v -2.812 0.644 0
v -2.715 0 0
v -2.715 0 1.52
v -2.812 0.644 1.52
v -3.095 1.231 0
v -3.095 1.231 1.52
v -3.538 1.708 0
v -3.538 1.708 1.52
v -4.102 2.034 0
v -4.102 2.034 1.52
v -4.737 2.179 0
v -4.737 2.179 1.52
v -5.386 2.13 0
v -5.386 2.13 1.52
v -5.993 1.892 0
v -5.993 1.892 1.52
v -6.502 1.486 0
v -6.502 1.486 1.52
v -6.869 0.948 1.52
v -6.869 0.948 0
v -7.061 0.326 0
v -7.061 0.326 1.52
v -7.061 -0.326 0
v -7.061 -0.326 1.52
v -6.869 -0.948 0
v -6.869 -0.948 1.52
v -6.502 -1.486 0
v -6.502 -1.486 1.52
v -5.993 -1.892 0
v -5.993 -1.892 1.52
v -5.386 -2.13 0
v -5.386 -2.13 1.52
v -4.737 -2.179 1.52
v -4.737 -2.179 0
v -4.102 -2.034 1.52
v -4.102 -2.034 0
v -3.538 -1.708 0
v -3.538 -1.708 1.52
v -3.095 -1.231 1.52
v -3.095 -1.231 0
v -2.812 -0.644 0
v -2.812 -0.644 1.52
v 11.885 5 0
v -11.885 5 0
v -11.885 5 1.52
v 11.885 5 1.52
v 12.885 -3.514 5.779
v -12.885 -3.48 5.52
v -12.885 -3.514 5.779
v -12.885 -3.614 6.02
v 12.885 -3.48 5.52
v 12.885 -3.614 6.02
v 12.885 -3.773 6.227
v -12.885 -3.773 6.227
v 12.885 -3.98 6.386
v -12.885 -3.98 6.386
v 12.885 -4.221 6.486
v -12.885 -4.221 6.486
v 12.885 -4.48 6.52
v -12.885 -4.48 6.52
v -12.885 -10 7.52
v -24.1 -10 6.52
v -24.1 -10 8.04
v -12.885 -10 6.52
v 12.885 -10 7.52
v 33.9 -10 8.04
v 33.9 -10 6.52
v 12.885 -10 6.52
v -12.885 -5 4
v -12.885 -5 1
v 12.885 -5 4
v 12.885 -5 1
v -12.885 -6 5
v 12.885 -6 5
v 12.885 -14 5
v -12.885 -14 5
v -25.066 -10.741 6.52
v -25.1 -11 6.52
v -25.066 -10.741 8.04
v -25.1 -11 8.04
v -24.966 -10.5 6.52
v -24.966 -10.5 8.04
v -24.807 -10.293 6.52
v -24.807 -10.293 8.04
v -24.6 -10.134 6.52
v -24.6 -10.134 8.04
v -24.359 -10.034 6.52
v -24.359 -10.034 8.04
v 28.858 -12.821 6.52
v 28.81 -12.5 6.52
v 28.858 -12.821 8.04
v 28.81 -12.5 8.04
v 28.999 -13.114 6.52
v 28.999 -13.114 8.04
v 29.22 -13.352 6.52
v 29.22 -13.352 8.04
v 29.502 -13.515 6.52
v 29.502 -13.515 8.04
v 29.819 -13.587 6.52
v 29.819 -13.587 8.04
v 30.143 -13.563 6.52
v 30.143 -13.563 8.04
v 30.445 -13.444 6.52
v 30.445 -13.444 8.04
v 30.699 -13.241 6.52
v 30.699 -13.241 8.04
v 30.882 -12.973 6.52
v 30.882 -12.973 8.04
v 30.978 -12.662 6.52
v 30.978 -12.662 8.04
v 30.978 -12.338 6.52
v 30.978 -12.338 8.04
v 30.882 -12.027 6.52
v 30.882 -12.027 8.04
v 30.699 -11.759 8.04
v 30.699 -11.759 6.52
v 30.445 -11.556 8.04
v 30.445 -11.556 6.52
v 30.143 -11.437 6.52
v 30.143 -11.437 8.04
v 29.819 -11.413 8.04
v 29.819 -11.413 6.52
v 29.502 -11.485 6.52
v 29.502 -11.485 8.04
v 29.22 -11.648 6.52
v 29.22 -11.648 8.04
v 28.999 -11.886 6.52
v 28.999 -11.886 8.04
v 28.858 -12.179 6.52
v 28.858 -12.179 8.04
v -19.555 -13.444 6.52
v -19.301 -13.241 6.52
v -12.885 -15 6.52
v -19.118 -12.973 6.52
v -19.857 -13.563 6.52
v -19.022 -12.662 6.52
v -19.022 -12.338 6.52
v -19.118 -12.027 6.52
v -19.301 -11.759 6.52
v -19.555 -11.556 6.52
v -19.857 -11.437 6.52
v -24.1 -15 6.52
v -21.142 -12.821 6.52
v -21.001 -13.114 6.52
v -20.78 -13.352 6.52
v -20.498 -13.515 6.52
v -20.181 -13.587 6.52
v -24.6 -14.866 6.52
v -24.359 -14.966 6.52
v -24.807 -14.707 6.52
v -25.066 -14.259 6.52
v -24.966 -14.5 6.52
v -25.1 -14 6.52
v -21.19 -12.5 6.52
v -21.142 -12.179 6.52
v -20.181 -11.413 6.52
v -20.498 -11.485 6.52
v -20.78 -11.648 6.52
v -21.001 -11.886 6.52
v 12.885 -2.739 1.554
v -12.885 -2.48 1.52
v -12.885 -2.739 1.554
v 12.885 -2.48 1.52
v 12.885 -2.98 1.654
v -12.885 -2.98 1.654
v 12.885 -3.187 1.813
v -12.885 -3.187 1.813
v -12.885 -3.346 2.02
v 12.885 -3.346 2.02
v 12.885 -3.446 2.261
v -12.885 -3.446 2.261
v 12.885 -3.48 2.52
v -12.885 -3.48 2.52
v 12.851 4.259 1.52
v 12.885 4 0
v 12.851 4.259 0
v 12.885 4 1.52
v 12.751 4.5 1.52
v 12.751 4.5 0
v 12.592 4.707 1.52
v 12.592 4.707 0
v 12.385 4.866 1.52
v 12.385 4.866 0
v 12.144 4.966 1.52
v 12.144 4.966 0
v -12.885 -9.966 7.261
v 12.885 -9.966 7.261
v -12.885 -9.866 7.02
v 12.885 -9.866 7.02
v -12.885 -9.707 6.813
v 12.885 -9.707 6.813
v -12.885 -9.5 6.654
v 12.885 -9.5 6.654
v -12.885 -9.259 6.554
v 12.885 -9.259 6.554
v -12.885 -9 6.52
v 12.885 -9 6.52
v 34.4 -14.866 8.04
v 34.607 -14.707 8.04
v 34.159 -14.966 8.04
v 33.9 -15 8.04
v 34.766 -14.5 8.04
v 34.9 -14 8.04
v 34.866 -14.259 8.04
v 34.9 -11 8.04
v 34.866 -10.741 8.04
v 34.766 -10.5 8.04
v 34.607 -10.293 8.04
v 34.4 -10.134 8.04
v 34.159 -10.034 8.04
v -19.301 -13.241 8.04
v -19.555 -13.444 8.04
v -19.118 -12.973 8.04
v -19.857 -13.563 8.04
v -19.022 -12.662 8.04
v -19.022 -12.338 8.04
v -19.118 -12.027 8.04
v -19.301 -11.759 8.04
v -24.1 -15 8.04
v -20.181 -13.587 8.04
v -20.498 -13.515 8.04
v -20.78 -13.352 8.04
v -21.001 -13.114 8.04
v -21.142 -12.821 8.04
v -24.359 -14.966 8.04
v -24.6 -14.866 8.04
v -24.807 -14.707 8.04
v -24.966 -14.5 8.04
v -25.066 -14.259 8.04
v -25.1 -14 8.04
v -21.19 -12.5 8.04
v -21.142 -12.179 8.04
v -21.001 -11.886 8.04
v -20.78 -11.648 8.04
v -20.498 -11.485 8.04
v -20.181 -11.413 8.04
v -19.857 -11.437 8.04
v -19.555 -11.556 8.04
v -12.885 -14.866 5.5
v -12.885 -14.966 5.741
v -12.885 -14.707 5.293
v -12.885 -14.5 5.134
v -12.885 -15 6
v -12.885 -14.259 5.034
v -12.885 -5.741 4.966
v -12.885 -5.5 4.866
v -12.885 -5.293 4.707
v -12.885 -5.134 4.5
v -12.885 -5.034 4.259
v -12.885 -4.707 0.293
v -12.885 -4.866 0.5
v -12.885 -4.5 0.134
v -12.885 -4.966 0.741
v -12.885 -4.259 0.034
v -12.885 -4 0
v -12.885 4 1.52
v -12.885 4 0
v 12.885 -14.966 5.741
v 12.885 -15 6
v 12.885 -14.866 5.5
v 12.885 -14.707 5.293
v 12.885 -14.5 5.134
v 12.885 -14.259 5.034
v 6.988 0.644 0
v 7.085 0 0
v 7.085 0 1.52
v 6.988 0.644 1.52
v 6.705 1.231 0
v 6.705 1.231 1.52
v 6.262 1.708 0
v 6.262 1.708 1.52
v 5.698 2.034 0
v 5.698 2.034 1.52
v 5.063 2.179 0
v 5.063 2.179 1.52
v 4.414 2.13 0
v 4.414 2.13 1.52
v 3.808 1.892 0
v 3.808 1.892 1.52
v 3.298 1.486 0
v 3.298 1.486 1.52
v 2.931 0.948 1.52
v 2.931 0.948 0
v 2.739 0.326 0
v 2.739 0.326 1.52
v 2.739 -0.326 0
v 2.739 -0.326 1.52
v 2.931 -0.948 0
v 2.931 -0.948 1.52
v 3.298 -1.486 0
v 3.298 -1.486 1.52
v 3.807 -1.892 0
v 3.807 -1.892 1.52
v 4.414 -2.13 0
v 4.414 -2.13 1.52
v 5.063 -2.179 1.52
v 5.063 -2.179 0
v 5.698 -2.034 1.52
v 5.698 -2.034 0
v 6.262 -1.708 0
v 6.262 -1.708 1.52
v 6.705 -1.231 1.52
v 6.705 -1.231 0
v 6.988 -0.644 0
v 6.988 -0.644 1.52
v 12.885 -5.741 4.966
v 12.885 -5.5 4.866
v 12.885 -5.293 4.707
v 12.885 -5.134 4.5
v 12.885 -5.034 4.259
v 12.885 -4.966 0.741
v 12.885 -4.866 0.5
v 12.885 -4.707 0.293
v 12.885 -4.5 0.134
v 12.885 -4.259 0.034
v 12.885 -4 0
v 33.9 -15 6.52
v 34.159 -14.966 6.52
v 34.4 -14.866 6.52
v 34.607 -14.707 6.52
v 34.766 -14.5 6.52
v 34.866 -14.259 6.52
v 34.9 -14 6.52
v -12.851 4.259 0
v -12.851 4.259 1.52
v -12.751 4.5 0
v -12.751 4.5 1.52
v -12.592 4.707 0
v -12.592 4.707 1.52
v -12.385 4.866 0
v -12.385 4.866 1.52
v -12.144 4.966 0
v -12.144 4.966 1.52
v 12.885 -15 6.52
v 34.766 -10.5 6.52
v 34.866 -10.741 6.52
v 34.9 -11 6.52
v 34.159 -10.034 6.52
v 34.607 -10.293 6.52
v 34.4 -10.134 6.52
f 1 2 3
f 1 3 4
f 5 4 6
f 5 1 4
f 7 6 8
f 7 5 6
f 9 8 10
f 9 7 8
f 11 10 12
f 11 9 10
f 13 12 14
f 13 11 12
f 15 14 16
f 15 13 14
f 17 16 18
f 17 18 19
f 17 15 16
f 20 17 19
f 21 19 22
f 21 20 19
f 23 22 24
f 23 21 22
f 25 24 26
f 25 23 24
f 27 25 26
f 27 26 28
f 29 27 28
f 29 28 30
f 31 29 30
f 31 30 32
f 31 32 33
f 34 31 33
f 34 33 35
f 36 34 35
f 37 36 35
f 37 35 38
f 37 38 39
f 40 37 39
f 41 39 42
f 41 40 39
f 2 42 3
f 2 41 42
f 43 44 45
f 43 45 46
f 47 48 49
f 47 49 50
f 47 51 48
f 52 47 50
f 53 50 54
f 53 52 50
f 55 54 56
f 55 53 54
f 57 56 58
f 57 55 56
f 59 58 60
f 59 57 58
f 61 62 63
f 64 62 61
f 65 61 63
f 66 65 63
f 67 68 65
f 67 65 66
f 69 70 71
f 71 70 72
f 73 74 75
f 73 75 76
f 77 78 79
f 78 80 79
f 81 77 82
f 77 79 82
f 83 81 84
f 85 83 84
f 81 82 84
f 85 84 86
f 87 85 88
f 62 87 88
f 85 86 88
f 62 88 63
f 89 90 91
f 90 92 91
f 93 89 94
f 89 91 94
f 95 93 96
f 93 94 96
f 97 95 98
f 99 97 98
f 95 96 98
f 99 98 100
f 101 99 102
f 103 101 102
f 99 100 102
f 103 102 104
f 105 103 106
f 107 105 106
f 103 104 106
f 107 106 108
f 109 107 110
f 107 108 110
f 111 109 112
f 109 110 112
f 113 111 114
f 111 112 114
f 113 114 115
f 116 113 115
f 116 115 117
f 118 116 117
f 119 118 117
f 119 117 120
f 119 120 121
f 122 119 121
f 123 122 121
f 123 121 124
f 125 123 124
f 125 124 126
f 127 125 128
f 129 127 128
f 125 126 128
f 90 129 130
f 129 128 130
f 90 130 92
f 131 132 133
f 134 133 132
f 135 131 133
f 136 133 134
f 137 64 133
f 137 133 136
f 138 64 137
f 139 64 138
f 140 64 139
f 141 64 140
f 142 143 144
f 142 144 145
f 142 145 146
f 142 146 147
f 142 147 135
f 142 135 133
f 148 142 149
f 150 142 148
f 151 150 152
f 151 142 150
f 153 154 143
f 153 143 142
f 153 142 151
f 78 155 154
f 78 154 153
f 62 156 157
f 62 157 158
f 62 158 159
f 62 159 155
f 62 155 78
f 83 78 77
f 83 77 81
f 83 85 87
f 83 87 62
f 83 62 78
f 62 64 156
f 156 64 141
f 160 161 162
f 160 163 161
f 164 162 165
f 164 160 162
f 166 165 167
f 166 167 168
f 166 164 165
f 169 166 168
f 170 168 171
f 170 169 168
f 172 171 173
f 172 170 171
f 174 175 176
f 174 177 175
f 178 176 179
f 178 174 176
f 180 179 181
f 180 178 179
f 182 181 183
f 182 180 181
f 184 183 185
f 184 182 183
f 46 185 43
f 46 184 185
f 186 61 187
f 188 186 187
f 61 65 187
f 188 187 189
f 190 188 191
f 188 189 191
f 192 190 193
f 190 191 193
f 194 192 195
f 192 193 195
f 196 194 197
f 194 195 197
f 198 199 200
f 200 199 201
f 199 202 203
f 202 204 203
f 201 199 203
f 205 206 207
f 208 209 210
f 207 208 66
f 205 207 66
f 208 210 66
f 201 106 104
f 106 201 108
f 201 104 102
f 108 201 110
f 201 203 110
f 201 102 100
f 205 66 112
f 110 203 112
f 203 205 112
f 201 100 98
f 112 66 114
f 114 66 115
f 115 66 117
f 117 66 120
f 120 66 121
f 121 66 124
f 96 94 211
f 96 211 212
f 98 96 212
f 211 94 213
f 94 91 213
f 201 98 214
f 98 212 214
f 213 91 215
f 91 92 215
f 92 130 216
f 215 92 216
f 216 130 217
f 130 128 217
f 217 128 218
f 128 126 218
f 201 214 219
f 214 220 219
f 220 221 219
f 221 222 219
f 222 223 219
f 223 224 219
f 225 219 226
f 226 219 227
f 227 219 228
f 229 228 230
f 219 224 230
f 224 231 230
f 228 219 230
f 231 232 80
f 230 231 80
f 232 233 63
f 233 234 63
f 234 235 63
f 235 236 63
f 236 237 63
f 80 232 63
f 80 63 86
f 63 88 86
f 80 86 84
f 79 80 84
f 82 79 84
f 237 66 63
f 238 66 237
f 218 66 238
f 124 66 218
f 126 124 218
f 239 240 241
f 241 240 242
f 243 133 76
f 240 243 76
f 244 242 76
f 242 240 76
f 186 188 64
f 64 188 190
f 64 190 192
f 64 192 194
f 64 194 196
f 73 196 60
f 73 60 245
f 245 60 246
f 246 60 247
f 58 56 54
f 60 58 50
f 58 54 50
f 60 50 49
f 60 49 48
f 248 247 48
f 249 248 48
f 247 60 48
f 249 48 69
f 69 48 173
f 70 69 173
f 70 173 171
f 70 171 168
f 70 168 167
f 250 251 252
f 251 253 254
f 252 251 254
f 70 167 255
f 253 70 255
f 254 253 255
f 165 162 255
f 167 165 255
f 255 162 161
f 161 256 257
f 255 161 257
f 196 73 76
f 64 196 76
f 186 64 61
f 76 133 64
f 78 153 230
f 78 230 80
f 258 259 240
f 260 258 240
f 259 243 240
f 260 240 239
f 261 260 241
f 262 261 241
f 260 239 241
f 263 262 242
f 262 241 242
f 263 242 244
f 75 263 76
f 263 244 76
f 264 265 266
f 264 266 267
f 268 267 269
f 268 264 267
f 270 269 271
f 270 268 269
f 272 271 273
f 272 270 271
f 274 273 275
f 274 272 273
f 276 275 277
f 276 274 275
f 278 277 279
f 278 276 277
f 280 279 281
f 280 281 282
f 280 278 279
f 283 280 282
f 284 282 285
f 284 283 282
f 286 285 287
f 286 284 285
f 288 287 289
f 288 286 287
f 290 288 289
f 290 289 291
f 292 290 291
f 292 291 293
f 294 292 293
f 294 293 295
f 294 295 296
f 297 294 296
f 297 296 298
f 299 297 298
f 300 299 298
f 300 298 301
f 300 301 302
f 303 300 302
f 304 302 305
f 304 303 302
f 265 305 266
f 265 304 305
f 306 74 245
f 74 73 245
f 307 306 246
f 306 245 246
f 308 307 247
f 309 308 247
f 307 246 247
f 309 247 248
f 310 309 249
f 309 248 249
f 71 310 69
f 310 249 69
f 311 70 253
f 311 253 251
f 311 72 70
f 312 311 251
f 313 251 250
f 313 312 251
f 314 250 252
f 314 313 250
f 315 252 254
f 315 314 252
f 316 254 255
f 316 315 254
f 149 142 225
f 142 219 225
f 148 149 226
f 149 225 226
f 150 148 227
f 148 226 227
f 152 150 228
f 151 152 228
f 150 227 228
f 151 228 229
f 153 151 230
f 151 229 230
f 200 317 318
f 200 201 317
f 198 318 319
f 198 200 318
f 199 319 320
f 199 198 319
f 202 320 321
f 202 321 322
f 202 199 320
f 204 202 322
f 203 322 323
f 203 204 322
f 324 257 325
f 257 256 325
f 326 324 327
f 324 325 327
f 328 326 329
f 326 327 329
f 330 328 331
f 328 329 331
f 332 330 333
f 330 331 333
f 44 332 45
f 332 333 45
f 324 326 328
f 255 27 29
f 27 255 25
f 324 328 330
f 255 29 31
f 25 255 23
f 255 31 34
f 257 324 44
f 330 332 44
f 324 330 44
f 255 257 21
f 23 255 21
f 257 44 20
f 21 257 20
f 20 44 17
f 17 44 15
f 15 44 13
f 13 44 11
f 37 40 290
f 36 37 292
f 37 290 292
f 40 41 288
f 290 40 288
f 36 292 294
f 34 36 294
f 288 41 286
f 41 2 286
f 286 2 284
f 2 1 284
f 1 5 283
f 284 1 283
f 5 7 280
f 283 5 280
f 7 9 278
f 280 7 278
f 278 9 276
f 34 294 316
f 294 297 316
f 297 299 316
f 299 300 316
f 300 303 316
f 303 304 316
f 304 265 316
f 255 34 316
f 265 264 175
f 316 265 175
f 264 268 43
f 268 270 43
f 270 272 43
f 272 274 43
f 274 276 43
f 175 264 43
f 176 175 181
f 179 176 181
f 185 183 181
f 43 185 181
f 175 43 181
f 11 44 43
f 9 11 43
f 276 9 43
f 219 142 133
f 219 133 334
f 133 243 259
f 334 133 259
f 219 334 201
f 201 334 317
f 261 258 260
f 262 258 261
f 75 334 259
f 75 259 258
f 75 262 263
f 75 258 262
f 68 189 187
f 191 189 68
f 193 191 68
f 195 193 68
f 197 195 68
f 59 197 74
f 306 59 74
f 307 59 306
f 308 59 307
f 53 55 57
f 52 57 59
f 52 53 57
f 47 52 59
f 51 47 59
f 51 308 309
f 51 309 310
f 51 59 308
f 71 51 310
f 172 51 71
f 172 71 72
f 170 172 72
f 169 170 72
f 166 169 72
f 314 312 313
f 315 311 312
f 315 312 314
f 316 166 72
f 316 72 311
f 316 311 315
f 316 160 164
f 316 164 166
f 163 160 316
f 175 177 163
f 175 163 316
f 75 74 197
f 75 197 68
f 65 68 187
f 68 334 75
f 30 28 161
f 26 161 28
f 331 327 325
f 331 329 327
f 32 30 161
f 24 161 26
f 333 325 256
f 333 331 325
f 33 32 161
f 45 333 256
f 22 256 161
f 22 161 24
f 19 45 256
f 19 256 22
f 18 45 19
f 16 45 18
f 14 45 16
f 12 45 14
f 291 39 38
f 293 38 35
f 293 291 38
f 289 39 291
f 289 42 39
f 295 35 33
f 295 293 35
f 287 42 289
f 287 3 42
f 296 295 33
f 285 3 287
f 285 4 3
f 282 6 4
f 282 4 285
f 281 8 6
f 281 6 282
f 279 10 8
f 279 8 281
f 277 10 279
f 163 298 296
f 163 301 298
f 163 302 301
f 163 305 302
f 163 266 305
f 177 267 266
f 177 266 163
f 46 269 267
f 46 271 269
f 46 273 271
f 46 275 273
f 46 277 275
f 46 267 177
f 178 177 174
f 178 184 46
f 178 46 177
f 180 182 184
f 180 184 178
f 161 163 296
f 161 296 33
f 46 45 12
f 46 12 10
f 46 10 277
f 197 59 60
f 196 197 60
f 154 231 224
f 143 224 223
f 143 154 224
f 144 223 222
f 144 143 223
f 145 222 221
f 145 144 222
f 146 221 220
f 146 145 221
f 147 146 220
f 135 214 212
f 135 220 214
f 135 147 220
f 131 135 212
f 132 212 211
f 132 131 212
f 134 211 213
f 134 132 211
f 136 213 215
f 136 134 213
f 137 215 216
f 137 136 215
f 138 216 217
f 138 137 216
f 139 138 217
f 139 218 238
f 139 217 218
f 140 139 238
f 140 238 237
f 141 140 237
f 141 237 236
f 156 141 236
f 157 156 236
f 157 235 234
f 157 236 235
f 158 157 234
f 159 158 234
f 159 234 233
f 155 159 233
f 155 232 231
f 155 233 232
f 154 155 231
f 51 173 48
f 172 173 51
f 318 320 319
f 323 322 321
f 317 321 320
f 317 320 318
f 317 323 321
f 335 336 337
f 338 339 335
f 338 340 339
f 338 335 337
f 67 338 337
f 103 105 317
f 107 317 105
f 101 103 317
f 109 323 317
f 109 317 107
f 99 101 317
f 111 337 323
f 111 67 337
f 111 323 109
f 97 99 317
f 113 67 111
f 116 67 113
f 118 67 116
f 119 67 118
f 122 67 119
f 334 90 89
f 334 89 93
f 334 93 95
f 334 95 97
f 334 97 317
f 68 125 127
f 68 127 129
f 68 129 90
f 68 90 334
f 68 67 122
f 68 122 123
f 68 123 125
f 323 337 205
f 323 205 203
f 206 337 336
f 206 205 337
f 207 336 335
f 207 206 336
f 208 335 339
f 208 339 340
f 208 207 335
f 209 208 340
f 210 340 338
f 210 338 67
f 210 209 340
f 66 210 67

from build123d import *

# Parameters (mm, degrees)
SKETCH1_W           = 25.77
SKETCH1_H           = 10
SKETCH1_R           = 2.185
BOSS_EXTRUDE1_DEPTH = 1.52
SKETCH2_W           = 25.77
SKETCH2_H           = 1.52
BOSS_EXTRUDE2_DEPTH = 5
SKETCH3_W           = 25.77
SKETCH3_H           = 1.52
BOSS_EXTRUDE3_DEPTH = 10
BOSS_EXTRUDE4_DEPTH = 1.52
SKETCH5_R           = 1.09
CUT_EXTRUDE1_DEPTH  = 5
FILLET1_R           = 1


with BuildPart() as part:
    # Sketch1 → Boss-Extrude1 (new body)
    with BuildSketch(Plane.XY):
        Rectangle(SKETCH1_W, SKETCH1_H)
        with Locations((-4.9, 0)):
            Circle(SKETCH1_R, mode=Mode.SUBTRACT)
        with Locations((4.9, 0)):
            Circle(SKETCH1_R, mode=Mode.SUBTRACT)
    extrude(amount=BOSS_EXTRUDE1_DEPTH)

    # Sketch2 → Boss-Extrude2 (add)
    with BuildSketch(Plane.XY.offset(1.52)):
        with Locations((0, -4.24)):
            Rectangle(SKETCH2_W, SKETCH2_H)
    extrude(amount=BOSS_EXTRUDE2_DEPTH)

    # Sketch3 → Boss-Extrude3 (add)
    with BuildSketch(Plane(origin=(0, -5, 0), x_dir=(-1, 0, 0), z_dir=(0, -1, 0))):
        with Locations((0, -5.76)):
            Rectangle(SKETCH3_W, SKETCH3_H)
    extrude(amount=BOSS_EXTRUDE3_DEPTH)

    # Sketch4 → Boss-Extrude4 (add)
    with BuildSketch(Plane.XY.offset(6.52)):
        Polygon((-12.885, -15), (-25.1, -15), (-25.1, -10), (34.9, -10), (34.9, -15), align=None)
    extrude(amount=BOSS_EXTRUDE4_DEPTH)

    # Sketch5 → Cut-Extrude1 (cut, symmetric)
    with BuildSketch(Plane.XY.offset(6.52)):
        with Locations(Location((-20.1, -12.5, 0), (0, 0, 180))):
            Circle(SKETCH5_R)
        with Locations(Location((29.9, -12.5, 0), (0, 0, 180))):
            Circle(SKETCH5_R)
    extrude(amount=CUT_EXTRUDE1_DEPTH, both=True, mode=Mode.SUBTRACT)

    # Fillet1
    fillet1_edges = [part.edges().sort_by_distance(p)[0] for p in [
        (0, -5, 0),
        (0, -5, 5),
        (-25.1, -15, 7.28),
        (-25.1, -10, 7.28),
        (34.9, -15, 7.28),
        (34.9, -10, 7.28),
        (0, -10, 6.52),
        (0, -3.48, 6.52),
        (0, -3.48, 1.52),
        (-12.885, 5, 0.76),
        (12.885, 5, 0.76),
        (0, -15, 5),
    ]]
    fillet(fillet1_edges, radius=FILLET1_R)


solid = part.part
